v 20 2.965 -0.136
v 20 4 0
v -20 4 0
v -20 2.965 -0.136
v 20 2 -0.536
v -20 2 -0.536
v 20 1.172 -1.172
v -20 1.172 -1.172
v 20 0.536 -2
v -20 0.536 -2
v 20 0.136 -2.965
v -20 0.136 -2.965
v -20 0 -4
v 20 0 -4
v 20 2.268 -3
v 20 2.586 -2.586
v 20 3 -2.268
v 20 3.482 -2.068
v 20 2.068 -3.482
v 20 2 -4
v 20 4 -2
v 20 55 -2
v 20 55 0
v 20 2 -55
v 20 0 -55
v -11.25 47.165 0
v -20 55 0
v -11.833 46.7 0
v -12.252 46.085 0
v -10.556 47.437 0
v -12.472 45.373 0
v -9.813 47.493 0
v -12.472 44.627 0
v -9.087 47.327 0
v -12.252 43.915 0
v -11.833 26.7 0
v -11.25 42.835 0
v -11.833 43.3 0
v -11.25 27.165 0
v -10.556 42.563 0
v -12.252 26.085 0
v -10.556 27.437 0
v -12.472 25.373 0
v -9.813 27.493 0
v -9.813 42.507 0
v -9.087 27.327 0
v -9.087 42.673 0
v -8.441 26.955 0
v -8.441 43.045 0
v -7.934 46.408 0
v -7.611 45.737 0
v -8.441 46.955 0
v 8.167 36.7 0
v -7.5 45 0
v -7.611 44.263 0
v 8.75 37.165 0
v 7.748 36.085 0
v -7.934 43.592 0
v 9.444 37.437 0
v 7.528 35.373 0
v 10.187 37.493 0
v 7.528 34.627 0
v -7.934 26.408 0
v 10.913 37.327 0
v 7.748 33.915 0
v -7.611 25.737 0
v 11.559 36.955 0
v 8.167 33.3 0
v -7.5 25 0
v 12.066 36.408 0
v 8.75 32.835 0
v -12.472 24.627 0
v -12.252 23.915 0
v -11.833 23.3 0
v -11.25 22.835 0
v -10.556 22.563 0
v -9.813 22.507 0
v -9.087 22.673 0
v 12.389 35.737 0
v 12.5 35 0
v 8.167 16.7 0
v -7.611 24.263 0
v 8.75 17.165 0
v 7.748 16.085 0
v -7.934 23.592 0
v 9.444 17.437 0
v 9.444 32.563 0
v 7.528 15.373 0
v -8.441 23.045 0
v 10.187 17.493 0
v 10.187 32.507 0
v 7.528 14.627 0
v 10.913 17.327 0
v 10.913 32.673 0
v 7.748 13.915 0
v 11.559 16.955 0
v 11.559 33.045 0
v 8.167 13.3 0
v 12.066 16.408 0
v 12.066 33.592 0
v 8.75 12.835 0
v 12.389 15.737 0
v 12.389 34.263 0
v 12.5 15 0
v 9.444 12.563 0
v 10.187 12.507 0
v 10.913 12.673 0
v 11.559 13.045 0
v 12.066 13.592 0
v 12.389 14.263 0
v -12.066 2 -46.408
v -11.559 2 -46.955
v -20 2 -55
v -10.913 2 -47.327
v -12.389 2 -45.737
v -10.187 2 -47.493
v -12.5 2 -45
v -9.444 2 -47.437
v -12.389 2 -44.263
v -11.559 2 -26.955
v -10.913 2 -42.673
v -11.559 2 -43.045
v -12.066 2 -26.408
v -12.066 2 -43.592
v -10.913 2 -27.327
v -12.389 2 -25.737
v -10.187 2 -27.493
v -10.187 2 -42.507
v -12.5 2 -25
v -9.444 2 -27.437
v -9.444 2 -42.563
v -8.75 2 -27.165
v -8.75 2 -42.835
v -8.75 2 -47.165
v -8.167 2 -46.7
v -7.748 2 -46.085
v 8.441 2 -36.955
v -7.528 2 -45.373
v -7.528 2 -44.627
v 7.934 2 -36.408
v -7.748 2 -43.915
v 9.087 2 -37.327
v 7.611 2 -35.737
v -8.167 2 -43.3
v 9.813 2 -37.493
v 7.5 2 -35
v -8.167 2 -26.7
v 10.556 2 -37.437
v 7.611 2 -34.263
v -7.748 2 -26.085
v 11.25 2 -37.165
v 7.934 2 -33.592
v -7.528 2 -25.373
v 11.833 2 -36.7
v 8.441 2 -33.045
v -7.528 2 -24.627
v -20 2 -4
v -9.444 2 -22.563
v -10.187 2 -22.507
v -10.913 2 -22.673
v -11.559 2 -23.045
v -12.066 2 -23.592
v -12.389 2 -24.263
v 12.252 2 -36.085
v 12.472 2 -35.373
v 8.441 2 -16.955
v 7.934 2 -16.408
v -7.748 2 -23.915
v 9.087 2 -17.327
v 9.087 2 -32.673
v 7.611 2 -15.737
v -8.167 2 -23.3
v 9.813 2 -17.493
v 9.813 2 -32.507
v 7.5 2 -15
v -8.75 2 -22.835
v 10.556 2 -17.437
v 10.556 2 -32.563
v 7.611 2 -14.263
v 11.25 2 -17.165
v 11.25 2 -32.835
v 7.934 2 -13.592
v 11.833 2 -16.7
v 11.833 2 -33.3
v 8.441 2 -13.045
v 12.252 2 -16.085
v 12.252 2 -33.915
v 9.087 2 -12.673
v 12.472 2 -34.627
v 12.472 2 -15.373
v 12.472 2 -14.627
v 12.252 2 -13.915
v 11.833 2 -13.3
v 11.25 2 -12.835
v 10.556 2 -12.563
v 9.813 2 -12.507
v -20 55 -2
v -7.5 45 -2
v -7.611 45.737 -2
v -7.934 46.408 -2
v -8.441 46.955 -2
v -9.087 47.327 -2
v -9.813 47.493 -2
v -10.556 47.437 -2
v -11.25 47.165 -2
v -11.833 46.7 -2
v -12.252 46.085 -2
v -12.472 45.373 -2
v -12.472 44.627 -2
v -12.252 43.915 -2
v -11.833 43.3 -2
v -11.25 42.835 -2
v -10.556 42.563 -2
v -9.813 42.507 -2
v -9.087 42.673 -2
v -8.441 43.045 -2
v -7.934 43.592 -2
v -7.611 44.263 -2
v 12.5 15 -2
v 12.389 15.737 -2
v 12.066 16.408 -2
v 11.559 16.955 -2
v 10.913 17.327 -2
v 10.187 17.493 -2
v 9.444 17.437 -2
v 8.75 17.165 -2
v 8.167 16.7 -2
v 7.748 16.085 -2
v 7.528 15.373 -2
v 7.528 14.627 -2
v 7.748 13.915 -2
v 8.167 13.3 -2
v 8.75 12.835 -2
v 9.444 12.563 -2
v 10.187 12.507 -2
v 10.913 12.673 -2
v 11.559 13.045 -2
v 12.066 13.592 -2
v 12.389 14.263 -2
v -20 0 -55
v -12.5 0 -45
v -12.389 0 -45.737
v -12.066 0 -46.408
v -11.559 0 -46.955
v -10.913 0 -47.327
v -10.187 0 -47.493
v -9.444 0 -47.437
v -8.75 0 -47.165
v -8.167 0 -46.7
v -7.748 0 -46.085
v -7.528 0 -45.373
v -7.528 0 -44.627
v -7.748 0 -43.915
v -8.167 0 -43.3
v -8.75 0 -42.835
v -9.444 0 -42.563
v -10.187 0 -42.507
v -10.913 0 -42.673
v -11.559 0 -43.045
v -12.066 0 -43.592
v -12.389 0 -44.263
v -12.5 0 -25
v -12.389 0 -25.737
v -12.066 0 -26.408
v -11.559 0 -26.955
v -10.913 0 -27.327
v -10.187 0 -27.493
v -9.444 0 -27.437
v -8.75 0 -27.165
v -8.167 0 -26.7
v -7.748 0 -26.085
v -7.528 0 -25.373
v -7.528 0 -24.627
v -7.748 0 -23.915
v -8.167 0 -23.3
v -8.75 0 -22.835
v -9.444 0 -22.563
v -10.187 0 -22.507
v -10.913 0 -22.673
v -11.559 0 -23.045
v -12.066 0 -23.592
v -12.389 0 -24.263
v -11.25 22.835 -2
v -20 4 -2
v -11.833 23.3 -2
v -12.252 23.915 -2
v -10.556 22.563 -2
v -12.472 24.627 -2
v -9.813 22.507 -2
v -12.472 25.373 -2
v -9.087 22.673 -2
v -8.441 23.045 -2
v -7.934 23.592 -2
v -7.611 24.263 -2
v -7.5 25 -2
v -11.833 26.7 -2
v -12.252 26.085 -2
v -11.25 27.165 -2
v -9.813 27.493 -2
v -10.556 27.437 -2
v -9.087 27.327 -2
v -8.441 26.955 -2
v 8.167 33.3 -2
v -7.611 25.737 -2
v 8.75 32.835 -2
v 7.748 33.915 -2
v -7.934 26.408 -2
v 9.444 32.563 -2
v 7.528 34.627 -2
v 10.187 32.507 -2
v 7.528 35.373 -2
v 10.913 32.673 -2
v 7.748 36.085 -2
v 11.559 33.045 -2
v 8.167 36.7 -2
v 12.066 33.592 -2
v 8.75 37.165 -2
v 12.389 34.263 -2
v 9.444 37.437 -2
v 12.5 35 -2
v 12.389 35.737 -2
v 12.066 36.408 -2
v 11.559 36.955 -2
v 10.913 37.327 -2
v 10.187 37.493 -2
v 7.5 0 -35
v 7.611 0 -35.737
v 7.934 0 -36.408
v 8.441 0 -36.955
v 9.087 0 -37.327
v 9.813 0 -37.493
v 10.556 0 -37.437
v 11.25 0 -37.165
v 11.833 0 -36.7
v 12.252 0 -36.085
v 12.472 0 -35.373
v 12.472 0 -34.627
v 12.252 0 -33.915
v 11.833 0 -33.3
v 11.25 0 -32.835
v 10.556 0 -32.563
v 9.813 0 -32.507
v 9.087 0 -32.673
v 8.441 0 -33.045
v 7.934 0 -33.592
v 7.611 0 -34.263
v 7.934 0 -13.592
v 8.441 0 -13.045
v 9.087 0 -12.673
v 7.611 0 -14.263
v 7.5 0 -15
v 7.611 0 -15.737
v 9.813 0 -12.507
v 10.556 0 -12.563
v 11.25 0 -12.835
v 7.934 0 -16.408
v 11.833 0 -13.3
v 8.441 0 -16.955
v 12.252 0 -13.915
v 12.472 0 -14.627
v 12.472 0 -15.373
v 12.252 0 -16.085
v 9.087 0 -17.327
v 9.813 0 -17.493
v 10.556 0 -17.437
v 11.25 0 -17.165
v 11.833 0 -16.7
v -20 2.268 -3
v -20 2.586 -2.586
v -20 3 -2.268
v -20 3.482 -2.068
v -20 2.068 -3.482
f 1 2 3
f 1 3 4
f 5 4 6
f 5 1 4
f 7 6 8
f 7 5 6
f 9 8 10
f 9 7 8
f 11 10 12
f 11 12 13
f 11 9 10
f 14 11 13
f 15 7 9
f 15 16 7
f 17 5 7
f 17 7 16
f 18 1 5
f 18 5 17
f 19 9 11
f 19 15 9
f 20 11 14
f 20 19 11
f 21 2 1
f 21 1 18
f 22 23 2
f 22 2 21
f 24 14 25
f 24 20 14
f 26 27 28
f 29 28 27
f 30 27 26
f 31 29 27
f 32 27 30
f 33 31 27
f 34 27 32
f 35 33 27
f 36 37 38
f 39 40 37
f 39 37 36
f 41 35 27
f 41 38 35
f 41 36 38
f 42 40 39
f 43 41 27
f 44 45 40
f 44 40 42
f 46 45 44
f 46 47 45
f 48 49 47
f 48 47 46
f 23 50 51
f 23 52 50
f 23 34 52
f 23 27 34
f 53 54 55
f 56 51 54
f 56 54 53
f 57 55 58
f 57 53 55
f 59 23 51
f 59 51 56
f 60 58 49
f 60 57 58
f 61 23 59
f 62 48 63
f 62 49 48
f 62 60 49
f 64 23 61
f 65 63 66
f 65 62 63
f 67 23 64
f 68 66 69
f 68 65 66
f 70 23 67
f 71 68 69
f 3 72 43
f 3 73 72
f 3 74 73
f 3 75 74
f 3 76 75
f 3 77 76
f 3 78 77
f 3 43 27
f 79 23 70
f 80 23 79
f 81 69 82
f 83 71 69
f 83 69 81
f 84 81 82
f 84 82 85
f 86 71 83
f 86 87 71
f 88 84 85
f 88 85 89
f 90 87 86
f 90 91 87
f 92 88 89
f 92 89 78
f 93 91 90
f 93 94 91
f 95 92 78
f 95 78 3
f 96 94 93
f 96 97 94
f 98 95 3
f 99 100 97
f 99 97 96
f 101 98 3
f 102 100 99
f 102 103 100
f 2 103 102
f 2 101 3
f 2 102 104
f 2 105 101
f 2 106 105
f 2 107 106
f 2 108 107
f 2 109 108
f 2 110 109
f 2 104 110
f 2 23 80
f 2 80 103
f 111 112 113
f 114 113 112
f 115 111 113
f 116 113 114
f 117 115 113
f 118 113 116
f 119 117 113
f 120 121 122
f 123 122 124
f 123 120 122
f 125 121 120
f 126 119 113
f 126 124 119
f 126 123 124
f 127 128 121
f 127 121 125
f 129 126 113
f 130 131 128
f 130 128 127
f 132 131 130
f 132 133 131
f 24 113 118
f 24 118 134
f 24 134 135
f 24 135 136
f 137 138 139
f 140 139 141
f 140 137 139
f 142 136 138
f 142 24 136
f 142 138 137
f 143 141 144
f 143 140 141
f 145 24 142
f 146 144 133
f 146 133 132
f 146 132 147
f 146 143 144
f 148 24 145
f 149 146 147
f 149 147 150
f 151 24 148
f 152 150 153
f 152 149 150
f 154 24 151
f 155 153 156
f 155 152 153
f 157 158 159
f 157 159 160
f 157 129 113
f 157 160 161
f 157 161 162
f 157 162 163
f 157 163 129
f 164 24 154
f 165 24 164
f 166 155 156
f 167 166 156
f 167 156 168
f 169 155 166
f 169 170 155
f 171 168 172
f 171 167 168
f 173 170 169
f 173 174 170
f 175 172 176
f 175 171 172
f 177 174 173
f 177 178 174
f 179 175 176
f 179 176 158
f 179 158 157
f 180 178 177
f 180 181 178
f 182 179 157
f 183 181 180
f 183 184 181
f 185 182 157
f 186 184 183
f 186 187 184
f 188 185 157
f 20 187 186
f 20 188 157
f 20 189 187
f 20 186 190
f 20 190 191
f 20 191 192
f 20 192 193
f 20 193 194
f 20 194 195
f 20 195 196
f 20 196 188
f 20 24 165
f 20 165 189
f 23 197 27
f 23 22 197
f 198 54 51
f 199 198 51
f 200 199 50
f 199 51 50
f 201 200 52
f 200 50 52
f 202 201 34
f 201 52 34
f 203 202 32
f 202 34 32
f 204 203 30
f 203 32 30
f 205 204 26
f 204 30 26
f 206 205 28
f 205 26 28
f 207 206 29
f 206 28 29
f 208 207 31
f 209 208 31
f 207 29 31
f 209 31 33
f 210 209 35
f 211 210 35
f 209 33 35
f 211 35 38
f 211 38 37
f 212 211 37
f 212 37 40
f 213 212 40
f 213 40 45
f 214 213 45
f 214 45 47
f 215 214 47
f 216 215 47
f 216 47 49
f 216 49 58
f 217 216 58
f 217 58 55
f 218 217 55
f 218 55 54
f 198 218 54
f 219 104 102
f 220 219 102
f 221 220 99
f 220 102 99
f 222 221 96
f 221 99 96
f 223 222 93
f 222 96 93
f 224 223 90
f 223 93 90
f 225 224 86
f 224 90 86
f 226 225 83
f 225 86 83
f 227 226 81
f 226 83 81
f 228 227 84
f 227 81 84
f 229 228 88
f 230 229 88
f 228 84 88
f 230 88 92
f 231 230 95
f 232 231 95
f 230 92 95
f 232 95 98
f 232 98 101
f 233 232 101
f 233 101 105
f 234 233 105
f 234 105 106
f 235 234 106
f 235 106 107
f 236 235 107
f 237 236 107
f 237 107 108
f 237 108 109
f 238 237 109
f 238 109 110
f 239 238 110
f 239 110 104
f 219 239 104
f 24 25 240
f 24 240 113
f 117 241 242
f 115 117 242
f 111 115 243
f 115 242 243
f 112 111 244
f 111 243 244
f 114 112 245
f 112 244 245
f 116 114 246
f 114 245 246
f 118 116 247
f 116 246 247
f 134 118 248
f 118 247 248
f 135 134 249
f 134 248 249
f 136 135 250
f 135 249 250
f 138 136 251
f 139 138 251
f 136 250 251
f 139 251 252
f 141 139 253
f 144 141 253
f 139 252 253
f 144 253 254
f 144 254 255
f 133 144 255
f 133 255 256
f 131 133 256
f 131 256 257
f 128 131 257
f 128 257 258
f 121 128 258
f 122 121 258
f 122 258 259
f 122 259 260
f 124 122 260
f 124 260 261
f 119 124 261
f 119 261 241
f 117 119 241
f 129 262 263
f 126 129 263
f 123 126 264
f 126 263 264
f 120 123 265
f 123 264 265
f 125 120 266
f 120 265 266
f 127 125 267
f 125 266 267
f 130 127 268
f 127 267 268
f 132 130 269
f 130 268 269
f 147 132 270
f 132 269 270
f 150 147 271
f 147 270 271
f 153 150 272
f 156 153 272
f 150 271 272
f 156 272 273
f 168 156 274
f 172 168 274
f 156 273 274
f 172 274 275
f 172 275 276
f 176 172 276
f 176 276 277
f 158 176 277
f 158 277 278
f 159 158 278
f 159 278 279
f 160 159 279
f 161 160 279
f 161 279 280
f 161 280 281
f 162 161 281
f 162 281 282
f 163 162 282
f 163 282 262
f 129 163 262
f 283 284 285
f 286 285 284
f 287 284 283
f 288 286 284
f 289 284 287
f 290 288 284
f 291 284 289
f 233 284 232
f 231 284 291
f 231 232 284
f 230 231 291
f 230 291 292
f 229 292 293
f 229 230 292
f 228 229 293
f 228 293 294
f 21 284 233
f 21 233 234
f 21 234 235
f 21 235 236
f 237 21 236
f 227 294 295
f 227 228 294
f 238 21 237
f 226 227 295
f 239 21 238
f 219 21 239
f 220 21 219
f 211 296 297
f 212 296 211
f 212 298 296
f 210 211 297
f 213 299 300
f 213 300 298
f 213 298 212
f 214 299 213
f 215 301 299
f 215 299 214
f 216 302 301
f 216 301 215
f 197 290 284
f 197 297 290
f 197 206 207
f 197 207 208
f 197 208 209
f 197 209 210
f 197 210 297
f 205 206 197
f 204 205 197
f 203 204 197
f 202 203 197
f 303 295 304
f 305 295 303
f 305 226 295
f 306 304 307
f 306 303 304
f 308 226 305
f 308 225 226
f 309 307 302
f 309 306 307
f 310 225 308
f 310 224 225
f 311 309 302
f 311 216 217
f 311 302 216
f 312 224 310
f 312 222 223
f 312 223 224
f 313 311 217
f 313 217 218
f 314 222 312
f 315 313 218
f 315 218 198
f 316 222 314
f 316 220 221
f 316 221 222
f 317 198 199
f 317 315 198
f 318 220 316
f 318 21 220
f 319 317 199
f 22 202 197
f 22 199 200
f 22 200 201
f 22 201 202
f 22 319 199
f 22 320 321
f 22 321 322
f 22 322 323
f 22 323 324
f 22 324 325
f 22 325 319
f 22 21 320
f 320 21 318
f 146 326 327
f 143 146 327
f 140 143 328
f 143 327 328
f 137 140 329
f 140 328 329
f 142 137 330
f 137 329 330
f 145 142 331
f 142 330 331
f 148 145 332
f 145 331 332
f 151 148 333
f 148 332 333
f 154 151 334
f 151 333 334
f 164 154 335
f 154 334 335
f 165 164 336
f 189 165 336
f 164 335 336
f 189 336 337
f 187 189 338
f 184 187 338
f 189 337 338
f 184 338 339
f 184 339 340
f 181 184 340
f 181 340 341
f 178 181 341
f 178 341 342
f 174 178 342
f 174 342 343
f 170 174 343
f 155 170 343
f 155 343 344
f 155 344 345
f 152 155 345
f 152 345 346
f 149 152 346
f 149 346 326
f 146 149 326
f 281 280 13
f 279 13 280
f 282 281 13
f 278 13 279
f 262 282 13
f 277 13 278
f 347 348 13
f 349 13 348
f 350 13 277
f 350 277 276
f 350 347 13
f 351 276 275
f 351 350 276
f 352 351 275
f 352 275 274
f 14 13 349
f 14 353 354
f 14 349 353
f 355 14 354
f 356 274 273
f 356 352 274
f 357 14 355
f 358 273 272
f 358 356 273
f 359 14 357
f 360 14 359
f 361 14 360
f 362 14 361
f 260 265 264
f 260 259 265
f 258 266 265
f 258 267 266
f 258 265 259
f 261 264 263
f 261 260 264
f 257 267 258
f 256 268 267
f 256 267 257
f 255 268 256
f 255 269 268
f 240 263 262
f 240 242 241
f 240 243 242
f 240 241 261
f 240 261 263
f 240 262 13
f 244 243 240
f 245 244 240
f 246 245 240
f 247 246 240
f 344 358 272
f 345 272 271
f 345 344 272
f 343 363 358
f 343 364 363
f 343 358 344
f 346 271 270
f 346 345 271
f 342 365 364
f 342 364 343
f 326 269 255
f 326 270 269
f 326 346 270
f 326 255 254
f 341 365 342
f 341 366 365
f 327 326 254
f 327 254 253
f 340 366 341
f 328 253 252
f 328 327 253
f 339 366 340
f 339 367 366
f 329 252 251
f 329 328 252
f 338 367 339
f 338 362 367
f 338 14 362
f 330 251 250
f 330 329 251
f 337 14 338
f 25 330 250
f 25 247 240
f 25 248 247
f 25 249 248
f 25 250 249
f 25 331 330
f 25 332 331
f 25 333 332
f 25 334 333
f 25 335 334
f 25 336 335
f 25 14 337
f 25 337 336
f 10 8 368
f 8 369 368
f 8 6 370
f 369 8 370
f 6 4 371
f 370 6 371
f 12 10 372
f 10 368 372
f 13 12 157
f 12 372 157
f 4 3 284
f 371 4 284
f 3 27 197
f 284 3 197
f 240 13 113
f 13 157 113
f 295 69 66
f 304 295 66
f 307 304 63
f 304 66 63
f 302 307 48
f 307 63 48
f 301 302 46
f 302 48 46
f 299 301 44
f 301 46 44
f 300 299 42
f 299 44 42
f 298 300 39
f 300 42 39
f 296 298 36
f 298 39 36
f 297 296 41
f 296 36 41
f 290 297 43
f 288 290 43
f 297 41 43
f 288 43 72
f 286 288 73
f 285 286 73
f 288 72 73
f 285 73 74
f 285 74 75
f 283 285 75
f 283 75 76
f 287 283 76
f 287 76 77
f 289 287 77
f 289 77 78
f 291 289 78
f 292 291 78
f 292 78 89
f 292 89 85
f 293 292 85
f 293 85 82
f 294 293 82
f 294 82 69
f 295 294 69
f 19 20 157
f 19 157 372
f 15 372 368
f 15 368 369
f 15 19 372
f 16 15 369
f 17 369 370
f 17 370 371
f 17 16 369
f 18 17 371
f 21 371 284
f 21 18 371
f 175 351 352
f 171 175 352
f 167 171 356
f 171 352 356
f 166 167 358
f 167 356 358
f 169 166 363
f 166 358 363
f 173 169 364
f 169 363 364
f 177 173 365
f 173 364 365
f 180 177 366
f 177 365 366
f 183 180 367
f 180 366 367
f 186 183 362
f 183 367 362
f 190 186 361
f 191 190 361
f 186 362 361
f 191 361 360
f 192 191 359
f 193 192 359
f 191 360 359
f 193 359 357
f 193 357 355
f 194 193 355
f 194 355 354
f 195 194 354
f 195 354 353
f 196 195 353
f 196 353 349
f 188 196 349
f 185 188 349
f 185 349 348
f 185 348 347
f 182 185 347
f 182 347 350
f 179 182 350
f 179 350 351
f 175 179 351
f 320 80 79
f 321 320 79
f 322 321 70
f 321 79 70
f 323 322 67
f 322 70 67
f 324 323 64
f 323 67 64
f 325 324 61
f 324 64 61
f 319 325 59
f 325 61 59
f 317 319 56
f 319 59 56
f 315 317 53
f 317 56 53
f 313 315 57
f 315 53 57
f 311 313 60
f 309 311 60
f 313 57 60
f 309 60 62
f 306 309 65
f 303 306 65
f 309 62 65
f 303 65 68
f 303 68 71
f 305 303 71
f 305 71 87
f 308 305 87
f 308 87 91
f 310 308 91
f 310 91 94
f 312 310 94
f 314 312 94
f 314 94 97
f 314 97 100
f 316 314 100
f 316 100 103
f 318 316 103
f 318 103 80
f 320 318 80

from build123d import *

# Parameters (mm, degrees)
BOSS_EXTRU_1_DEPTH            = 20
DIAM_TRE_DU_PER_AGE_5_0_5_1_D = 5
DIAM_TRE_DU_PER_AGE_5_0_5_2_D = 5


with BuildPart() as part:
    # Esquisse1 → Boss.-Extru.1 (new body, symmetric)
    with BuildSketch(Plane(origin=(0, 0, 0), x_dir=(0, 0, -1), z_dir=(1, 0, 0))):
        with BuildLine():
            Line((0, 55), (0, 4))
            ThreePointArc((0, 4), (1.171572875, 1.171572875), (4, 0))
            Line((4, 0), (55, 0))
            Line((55, 0), (55, 2))
            Line((55, 2), (4, 2))
            ThreePointArc((4, 2), (2.585786438, 2.585786438), (2, 4))
            Line((2, 4), (2, 55))
            Line((2, 55), (0, 55))
        make_face()
    extrude(amount=BOSS_EXTRU_1_DEPTH, both=True)

    # Diamètre du perçage Ø5.0 (5)1 (through all)
    with Locations(Plane(origin=(0, 2, 0), x_dir=(1, 0, 0), z_dir=(0, 1, 0))):
        with Locations((-10, 45), (-10, 25), (10, 35), (10, 15)):
            Hole(DIAM_TRE_DU_PER_AGE_5_0_5_1_D / 2)

    # Diamètre du perçage Ø5.0 (5)2 (through all)
    with Locations(Plane(origin=(0, 0, -2), x_dir=(-1, 0, 0), z_dir=(0, 0, -1))):
        with Locations((-10, 15), (-10, 35), (10, 25), (10, 45)):
            Hole(DIAM_TRE_DU_PER_AGE_5_0_5_2_D / 2)


solid = part.part
